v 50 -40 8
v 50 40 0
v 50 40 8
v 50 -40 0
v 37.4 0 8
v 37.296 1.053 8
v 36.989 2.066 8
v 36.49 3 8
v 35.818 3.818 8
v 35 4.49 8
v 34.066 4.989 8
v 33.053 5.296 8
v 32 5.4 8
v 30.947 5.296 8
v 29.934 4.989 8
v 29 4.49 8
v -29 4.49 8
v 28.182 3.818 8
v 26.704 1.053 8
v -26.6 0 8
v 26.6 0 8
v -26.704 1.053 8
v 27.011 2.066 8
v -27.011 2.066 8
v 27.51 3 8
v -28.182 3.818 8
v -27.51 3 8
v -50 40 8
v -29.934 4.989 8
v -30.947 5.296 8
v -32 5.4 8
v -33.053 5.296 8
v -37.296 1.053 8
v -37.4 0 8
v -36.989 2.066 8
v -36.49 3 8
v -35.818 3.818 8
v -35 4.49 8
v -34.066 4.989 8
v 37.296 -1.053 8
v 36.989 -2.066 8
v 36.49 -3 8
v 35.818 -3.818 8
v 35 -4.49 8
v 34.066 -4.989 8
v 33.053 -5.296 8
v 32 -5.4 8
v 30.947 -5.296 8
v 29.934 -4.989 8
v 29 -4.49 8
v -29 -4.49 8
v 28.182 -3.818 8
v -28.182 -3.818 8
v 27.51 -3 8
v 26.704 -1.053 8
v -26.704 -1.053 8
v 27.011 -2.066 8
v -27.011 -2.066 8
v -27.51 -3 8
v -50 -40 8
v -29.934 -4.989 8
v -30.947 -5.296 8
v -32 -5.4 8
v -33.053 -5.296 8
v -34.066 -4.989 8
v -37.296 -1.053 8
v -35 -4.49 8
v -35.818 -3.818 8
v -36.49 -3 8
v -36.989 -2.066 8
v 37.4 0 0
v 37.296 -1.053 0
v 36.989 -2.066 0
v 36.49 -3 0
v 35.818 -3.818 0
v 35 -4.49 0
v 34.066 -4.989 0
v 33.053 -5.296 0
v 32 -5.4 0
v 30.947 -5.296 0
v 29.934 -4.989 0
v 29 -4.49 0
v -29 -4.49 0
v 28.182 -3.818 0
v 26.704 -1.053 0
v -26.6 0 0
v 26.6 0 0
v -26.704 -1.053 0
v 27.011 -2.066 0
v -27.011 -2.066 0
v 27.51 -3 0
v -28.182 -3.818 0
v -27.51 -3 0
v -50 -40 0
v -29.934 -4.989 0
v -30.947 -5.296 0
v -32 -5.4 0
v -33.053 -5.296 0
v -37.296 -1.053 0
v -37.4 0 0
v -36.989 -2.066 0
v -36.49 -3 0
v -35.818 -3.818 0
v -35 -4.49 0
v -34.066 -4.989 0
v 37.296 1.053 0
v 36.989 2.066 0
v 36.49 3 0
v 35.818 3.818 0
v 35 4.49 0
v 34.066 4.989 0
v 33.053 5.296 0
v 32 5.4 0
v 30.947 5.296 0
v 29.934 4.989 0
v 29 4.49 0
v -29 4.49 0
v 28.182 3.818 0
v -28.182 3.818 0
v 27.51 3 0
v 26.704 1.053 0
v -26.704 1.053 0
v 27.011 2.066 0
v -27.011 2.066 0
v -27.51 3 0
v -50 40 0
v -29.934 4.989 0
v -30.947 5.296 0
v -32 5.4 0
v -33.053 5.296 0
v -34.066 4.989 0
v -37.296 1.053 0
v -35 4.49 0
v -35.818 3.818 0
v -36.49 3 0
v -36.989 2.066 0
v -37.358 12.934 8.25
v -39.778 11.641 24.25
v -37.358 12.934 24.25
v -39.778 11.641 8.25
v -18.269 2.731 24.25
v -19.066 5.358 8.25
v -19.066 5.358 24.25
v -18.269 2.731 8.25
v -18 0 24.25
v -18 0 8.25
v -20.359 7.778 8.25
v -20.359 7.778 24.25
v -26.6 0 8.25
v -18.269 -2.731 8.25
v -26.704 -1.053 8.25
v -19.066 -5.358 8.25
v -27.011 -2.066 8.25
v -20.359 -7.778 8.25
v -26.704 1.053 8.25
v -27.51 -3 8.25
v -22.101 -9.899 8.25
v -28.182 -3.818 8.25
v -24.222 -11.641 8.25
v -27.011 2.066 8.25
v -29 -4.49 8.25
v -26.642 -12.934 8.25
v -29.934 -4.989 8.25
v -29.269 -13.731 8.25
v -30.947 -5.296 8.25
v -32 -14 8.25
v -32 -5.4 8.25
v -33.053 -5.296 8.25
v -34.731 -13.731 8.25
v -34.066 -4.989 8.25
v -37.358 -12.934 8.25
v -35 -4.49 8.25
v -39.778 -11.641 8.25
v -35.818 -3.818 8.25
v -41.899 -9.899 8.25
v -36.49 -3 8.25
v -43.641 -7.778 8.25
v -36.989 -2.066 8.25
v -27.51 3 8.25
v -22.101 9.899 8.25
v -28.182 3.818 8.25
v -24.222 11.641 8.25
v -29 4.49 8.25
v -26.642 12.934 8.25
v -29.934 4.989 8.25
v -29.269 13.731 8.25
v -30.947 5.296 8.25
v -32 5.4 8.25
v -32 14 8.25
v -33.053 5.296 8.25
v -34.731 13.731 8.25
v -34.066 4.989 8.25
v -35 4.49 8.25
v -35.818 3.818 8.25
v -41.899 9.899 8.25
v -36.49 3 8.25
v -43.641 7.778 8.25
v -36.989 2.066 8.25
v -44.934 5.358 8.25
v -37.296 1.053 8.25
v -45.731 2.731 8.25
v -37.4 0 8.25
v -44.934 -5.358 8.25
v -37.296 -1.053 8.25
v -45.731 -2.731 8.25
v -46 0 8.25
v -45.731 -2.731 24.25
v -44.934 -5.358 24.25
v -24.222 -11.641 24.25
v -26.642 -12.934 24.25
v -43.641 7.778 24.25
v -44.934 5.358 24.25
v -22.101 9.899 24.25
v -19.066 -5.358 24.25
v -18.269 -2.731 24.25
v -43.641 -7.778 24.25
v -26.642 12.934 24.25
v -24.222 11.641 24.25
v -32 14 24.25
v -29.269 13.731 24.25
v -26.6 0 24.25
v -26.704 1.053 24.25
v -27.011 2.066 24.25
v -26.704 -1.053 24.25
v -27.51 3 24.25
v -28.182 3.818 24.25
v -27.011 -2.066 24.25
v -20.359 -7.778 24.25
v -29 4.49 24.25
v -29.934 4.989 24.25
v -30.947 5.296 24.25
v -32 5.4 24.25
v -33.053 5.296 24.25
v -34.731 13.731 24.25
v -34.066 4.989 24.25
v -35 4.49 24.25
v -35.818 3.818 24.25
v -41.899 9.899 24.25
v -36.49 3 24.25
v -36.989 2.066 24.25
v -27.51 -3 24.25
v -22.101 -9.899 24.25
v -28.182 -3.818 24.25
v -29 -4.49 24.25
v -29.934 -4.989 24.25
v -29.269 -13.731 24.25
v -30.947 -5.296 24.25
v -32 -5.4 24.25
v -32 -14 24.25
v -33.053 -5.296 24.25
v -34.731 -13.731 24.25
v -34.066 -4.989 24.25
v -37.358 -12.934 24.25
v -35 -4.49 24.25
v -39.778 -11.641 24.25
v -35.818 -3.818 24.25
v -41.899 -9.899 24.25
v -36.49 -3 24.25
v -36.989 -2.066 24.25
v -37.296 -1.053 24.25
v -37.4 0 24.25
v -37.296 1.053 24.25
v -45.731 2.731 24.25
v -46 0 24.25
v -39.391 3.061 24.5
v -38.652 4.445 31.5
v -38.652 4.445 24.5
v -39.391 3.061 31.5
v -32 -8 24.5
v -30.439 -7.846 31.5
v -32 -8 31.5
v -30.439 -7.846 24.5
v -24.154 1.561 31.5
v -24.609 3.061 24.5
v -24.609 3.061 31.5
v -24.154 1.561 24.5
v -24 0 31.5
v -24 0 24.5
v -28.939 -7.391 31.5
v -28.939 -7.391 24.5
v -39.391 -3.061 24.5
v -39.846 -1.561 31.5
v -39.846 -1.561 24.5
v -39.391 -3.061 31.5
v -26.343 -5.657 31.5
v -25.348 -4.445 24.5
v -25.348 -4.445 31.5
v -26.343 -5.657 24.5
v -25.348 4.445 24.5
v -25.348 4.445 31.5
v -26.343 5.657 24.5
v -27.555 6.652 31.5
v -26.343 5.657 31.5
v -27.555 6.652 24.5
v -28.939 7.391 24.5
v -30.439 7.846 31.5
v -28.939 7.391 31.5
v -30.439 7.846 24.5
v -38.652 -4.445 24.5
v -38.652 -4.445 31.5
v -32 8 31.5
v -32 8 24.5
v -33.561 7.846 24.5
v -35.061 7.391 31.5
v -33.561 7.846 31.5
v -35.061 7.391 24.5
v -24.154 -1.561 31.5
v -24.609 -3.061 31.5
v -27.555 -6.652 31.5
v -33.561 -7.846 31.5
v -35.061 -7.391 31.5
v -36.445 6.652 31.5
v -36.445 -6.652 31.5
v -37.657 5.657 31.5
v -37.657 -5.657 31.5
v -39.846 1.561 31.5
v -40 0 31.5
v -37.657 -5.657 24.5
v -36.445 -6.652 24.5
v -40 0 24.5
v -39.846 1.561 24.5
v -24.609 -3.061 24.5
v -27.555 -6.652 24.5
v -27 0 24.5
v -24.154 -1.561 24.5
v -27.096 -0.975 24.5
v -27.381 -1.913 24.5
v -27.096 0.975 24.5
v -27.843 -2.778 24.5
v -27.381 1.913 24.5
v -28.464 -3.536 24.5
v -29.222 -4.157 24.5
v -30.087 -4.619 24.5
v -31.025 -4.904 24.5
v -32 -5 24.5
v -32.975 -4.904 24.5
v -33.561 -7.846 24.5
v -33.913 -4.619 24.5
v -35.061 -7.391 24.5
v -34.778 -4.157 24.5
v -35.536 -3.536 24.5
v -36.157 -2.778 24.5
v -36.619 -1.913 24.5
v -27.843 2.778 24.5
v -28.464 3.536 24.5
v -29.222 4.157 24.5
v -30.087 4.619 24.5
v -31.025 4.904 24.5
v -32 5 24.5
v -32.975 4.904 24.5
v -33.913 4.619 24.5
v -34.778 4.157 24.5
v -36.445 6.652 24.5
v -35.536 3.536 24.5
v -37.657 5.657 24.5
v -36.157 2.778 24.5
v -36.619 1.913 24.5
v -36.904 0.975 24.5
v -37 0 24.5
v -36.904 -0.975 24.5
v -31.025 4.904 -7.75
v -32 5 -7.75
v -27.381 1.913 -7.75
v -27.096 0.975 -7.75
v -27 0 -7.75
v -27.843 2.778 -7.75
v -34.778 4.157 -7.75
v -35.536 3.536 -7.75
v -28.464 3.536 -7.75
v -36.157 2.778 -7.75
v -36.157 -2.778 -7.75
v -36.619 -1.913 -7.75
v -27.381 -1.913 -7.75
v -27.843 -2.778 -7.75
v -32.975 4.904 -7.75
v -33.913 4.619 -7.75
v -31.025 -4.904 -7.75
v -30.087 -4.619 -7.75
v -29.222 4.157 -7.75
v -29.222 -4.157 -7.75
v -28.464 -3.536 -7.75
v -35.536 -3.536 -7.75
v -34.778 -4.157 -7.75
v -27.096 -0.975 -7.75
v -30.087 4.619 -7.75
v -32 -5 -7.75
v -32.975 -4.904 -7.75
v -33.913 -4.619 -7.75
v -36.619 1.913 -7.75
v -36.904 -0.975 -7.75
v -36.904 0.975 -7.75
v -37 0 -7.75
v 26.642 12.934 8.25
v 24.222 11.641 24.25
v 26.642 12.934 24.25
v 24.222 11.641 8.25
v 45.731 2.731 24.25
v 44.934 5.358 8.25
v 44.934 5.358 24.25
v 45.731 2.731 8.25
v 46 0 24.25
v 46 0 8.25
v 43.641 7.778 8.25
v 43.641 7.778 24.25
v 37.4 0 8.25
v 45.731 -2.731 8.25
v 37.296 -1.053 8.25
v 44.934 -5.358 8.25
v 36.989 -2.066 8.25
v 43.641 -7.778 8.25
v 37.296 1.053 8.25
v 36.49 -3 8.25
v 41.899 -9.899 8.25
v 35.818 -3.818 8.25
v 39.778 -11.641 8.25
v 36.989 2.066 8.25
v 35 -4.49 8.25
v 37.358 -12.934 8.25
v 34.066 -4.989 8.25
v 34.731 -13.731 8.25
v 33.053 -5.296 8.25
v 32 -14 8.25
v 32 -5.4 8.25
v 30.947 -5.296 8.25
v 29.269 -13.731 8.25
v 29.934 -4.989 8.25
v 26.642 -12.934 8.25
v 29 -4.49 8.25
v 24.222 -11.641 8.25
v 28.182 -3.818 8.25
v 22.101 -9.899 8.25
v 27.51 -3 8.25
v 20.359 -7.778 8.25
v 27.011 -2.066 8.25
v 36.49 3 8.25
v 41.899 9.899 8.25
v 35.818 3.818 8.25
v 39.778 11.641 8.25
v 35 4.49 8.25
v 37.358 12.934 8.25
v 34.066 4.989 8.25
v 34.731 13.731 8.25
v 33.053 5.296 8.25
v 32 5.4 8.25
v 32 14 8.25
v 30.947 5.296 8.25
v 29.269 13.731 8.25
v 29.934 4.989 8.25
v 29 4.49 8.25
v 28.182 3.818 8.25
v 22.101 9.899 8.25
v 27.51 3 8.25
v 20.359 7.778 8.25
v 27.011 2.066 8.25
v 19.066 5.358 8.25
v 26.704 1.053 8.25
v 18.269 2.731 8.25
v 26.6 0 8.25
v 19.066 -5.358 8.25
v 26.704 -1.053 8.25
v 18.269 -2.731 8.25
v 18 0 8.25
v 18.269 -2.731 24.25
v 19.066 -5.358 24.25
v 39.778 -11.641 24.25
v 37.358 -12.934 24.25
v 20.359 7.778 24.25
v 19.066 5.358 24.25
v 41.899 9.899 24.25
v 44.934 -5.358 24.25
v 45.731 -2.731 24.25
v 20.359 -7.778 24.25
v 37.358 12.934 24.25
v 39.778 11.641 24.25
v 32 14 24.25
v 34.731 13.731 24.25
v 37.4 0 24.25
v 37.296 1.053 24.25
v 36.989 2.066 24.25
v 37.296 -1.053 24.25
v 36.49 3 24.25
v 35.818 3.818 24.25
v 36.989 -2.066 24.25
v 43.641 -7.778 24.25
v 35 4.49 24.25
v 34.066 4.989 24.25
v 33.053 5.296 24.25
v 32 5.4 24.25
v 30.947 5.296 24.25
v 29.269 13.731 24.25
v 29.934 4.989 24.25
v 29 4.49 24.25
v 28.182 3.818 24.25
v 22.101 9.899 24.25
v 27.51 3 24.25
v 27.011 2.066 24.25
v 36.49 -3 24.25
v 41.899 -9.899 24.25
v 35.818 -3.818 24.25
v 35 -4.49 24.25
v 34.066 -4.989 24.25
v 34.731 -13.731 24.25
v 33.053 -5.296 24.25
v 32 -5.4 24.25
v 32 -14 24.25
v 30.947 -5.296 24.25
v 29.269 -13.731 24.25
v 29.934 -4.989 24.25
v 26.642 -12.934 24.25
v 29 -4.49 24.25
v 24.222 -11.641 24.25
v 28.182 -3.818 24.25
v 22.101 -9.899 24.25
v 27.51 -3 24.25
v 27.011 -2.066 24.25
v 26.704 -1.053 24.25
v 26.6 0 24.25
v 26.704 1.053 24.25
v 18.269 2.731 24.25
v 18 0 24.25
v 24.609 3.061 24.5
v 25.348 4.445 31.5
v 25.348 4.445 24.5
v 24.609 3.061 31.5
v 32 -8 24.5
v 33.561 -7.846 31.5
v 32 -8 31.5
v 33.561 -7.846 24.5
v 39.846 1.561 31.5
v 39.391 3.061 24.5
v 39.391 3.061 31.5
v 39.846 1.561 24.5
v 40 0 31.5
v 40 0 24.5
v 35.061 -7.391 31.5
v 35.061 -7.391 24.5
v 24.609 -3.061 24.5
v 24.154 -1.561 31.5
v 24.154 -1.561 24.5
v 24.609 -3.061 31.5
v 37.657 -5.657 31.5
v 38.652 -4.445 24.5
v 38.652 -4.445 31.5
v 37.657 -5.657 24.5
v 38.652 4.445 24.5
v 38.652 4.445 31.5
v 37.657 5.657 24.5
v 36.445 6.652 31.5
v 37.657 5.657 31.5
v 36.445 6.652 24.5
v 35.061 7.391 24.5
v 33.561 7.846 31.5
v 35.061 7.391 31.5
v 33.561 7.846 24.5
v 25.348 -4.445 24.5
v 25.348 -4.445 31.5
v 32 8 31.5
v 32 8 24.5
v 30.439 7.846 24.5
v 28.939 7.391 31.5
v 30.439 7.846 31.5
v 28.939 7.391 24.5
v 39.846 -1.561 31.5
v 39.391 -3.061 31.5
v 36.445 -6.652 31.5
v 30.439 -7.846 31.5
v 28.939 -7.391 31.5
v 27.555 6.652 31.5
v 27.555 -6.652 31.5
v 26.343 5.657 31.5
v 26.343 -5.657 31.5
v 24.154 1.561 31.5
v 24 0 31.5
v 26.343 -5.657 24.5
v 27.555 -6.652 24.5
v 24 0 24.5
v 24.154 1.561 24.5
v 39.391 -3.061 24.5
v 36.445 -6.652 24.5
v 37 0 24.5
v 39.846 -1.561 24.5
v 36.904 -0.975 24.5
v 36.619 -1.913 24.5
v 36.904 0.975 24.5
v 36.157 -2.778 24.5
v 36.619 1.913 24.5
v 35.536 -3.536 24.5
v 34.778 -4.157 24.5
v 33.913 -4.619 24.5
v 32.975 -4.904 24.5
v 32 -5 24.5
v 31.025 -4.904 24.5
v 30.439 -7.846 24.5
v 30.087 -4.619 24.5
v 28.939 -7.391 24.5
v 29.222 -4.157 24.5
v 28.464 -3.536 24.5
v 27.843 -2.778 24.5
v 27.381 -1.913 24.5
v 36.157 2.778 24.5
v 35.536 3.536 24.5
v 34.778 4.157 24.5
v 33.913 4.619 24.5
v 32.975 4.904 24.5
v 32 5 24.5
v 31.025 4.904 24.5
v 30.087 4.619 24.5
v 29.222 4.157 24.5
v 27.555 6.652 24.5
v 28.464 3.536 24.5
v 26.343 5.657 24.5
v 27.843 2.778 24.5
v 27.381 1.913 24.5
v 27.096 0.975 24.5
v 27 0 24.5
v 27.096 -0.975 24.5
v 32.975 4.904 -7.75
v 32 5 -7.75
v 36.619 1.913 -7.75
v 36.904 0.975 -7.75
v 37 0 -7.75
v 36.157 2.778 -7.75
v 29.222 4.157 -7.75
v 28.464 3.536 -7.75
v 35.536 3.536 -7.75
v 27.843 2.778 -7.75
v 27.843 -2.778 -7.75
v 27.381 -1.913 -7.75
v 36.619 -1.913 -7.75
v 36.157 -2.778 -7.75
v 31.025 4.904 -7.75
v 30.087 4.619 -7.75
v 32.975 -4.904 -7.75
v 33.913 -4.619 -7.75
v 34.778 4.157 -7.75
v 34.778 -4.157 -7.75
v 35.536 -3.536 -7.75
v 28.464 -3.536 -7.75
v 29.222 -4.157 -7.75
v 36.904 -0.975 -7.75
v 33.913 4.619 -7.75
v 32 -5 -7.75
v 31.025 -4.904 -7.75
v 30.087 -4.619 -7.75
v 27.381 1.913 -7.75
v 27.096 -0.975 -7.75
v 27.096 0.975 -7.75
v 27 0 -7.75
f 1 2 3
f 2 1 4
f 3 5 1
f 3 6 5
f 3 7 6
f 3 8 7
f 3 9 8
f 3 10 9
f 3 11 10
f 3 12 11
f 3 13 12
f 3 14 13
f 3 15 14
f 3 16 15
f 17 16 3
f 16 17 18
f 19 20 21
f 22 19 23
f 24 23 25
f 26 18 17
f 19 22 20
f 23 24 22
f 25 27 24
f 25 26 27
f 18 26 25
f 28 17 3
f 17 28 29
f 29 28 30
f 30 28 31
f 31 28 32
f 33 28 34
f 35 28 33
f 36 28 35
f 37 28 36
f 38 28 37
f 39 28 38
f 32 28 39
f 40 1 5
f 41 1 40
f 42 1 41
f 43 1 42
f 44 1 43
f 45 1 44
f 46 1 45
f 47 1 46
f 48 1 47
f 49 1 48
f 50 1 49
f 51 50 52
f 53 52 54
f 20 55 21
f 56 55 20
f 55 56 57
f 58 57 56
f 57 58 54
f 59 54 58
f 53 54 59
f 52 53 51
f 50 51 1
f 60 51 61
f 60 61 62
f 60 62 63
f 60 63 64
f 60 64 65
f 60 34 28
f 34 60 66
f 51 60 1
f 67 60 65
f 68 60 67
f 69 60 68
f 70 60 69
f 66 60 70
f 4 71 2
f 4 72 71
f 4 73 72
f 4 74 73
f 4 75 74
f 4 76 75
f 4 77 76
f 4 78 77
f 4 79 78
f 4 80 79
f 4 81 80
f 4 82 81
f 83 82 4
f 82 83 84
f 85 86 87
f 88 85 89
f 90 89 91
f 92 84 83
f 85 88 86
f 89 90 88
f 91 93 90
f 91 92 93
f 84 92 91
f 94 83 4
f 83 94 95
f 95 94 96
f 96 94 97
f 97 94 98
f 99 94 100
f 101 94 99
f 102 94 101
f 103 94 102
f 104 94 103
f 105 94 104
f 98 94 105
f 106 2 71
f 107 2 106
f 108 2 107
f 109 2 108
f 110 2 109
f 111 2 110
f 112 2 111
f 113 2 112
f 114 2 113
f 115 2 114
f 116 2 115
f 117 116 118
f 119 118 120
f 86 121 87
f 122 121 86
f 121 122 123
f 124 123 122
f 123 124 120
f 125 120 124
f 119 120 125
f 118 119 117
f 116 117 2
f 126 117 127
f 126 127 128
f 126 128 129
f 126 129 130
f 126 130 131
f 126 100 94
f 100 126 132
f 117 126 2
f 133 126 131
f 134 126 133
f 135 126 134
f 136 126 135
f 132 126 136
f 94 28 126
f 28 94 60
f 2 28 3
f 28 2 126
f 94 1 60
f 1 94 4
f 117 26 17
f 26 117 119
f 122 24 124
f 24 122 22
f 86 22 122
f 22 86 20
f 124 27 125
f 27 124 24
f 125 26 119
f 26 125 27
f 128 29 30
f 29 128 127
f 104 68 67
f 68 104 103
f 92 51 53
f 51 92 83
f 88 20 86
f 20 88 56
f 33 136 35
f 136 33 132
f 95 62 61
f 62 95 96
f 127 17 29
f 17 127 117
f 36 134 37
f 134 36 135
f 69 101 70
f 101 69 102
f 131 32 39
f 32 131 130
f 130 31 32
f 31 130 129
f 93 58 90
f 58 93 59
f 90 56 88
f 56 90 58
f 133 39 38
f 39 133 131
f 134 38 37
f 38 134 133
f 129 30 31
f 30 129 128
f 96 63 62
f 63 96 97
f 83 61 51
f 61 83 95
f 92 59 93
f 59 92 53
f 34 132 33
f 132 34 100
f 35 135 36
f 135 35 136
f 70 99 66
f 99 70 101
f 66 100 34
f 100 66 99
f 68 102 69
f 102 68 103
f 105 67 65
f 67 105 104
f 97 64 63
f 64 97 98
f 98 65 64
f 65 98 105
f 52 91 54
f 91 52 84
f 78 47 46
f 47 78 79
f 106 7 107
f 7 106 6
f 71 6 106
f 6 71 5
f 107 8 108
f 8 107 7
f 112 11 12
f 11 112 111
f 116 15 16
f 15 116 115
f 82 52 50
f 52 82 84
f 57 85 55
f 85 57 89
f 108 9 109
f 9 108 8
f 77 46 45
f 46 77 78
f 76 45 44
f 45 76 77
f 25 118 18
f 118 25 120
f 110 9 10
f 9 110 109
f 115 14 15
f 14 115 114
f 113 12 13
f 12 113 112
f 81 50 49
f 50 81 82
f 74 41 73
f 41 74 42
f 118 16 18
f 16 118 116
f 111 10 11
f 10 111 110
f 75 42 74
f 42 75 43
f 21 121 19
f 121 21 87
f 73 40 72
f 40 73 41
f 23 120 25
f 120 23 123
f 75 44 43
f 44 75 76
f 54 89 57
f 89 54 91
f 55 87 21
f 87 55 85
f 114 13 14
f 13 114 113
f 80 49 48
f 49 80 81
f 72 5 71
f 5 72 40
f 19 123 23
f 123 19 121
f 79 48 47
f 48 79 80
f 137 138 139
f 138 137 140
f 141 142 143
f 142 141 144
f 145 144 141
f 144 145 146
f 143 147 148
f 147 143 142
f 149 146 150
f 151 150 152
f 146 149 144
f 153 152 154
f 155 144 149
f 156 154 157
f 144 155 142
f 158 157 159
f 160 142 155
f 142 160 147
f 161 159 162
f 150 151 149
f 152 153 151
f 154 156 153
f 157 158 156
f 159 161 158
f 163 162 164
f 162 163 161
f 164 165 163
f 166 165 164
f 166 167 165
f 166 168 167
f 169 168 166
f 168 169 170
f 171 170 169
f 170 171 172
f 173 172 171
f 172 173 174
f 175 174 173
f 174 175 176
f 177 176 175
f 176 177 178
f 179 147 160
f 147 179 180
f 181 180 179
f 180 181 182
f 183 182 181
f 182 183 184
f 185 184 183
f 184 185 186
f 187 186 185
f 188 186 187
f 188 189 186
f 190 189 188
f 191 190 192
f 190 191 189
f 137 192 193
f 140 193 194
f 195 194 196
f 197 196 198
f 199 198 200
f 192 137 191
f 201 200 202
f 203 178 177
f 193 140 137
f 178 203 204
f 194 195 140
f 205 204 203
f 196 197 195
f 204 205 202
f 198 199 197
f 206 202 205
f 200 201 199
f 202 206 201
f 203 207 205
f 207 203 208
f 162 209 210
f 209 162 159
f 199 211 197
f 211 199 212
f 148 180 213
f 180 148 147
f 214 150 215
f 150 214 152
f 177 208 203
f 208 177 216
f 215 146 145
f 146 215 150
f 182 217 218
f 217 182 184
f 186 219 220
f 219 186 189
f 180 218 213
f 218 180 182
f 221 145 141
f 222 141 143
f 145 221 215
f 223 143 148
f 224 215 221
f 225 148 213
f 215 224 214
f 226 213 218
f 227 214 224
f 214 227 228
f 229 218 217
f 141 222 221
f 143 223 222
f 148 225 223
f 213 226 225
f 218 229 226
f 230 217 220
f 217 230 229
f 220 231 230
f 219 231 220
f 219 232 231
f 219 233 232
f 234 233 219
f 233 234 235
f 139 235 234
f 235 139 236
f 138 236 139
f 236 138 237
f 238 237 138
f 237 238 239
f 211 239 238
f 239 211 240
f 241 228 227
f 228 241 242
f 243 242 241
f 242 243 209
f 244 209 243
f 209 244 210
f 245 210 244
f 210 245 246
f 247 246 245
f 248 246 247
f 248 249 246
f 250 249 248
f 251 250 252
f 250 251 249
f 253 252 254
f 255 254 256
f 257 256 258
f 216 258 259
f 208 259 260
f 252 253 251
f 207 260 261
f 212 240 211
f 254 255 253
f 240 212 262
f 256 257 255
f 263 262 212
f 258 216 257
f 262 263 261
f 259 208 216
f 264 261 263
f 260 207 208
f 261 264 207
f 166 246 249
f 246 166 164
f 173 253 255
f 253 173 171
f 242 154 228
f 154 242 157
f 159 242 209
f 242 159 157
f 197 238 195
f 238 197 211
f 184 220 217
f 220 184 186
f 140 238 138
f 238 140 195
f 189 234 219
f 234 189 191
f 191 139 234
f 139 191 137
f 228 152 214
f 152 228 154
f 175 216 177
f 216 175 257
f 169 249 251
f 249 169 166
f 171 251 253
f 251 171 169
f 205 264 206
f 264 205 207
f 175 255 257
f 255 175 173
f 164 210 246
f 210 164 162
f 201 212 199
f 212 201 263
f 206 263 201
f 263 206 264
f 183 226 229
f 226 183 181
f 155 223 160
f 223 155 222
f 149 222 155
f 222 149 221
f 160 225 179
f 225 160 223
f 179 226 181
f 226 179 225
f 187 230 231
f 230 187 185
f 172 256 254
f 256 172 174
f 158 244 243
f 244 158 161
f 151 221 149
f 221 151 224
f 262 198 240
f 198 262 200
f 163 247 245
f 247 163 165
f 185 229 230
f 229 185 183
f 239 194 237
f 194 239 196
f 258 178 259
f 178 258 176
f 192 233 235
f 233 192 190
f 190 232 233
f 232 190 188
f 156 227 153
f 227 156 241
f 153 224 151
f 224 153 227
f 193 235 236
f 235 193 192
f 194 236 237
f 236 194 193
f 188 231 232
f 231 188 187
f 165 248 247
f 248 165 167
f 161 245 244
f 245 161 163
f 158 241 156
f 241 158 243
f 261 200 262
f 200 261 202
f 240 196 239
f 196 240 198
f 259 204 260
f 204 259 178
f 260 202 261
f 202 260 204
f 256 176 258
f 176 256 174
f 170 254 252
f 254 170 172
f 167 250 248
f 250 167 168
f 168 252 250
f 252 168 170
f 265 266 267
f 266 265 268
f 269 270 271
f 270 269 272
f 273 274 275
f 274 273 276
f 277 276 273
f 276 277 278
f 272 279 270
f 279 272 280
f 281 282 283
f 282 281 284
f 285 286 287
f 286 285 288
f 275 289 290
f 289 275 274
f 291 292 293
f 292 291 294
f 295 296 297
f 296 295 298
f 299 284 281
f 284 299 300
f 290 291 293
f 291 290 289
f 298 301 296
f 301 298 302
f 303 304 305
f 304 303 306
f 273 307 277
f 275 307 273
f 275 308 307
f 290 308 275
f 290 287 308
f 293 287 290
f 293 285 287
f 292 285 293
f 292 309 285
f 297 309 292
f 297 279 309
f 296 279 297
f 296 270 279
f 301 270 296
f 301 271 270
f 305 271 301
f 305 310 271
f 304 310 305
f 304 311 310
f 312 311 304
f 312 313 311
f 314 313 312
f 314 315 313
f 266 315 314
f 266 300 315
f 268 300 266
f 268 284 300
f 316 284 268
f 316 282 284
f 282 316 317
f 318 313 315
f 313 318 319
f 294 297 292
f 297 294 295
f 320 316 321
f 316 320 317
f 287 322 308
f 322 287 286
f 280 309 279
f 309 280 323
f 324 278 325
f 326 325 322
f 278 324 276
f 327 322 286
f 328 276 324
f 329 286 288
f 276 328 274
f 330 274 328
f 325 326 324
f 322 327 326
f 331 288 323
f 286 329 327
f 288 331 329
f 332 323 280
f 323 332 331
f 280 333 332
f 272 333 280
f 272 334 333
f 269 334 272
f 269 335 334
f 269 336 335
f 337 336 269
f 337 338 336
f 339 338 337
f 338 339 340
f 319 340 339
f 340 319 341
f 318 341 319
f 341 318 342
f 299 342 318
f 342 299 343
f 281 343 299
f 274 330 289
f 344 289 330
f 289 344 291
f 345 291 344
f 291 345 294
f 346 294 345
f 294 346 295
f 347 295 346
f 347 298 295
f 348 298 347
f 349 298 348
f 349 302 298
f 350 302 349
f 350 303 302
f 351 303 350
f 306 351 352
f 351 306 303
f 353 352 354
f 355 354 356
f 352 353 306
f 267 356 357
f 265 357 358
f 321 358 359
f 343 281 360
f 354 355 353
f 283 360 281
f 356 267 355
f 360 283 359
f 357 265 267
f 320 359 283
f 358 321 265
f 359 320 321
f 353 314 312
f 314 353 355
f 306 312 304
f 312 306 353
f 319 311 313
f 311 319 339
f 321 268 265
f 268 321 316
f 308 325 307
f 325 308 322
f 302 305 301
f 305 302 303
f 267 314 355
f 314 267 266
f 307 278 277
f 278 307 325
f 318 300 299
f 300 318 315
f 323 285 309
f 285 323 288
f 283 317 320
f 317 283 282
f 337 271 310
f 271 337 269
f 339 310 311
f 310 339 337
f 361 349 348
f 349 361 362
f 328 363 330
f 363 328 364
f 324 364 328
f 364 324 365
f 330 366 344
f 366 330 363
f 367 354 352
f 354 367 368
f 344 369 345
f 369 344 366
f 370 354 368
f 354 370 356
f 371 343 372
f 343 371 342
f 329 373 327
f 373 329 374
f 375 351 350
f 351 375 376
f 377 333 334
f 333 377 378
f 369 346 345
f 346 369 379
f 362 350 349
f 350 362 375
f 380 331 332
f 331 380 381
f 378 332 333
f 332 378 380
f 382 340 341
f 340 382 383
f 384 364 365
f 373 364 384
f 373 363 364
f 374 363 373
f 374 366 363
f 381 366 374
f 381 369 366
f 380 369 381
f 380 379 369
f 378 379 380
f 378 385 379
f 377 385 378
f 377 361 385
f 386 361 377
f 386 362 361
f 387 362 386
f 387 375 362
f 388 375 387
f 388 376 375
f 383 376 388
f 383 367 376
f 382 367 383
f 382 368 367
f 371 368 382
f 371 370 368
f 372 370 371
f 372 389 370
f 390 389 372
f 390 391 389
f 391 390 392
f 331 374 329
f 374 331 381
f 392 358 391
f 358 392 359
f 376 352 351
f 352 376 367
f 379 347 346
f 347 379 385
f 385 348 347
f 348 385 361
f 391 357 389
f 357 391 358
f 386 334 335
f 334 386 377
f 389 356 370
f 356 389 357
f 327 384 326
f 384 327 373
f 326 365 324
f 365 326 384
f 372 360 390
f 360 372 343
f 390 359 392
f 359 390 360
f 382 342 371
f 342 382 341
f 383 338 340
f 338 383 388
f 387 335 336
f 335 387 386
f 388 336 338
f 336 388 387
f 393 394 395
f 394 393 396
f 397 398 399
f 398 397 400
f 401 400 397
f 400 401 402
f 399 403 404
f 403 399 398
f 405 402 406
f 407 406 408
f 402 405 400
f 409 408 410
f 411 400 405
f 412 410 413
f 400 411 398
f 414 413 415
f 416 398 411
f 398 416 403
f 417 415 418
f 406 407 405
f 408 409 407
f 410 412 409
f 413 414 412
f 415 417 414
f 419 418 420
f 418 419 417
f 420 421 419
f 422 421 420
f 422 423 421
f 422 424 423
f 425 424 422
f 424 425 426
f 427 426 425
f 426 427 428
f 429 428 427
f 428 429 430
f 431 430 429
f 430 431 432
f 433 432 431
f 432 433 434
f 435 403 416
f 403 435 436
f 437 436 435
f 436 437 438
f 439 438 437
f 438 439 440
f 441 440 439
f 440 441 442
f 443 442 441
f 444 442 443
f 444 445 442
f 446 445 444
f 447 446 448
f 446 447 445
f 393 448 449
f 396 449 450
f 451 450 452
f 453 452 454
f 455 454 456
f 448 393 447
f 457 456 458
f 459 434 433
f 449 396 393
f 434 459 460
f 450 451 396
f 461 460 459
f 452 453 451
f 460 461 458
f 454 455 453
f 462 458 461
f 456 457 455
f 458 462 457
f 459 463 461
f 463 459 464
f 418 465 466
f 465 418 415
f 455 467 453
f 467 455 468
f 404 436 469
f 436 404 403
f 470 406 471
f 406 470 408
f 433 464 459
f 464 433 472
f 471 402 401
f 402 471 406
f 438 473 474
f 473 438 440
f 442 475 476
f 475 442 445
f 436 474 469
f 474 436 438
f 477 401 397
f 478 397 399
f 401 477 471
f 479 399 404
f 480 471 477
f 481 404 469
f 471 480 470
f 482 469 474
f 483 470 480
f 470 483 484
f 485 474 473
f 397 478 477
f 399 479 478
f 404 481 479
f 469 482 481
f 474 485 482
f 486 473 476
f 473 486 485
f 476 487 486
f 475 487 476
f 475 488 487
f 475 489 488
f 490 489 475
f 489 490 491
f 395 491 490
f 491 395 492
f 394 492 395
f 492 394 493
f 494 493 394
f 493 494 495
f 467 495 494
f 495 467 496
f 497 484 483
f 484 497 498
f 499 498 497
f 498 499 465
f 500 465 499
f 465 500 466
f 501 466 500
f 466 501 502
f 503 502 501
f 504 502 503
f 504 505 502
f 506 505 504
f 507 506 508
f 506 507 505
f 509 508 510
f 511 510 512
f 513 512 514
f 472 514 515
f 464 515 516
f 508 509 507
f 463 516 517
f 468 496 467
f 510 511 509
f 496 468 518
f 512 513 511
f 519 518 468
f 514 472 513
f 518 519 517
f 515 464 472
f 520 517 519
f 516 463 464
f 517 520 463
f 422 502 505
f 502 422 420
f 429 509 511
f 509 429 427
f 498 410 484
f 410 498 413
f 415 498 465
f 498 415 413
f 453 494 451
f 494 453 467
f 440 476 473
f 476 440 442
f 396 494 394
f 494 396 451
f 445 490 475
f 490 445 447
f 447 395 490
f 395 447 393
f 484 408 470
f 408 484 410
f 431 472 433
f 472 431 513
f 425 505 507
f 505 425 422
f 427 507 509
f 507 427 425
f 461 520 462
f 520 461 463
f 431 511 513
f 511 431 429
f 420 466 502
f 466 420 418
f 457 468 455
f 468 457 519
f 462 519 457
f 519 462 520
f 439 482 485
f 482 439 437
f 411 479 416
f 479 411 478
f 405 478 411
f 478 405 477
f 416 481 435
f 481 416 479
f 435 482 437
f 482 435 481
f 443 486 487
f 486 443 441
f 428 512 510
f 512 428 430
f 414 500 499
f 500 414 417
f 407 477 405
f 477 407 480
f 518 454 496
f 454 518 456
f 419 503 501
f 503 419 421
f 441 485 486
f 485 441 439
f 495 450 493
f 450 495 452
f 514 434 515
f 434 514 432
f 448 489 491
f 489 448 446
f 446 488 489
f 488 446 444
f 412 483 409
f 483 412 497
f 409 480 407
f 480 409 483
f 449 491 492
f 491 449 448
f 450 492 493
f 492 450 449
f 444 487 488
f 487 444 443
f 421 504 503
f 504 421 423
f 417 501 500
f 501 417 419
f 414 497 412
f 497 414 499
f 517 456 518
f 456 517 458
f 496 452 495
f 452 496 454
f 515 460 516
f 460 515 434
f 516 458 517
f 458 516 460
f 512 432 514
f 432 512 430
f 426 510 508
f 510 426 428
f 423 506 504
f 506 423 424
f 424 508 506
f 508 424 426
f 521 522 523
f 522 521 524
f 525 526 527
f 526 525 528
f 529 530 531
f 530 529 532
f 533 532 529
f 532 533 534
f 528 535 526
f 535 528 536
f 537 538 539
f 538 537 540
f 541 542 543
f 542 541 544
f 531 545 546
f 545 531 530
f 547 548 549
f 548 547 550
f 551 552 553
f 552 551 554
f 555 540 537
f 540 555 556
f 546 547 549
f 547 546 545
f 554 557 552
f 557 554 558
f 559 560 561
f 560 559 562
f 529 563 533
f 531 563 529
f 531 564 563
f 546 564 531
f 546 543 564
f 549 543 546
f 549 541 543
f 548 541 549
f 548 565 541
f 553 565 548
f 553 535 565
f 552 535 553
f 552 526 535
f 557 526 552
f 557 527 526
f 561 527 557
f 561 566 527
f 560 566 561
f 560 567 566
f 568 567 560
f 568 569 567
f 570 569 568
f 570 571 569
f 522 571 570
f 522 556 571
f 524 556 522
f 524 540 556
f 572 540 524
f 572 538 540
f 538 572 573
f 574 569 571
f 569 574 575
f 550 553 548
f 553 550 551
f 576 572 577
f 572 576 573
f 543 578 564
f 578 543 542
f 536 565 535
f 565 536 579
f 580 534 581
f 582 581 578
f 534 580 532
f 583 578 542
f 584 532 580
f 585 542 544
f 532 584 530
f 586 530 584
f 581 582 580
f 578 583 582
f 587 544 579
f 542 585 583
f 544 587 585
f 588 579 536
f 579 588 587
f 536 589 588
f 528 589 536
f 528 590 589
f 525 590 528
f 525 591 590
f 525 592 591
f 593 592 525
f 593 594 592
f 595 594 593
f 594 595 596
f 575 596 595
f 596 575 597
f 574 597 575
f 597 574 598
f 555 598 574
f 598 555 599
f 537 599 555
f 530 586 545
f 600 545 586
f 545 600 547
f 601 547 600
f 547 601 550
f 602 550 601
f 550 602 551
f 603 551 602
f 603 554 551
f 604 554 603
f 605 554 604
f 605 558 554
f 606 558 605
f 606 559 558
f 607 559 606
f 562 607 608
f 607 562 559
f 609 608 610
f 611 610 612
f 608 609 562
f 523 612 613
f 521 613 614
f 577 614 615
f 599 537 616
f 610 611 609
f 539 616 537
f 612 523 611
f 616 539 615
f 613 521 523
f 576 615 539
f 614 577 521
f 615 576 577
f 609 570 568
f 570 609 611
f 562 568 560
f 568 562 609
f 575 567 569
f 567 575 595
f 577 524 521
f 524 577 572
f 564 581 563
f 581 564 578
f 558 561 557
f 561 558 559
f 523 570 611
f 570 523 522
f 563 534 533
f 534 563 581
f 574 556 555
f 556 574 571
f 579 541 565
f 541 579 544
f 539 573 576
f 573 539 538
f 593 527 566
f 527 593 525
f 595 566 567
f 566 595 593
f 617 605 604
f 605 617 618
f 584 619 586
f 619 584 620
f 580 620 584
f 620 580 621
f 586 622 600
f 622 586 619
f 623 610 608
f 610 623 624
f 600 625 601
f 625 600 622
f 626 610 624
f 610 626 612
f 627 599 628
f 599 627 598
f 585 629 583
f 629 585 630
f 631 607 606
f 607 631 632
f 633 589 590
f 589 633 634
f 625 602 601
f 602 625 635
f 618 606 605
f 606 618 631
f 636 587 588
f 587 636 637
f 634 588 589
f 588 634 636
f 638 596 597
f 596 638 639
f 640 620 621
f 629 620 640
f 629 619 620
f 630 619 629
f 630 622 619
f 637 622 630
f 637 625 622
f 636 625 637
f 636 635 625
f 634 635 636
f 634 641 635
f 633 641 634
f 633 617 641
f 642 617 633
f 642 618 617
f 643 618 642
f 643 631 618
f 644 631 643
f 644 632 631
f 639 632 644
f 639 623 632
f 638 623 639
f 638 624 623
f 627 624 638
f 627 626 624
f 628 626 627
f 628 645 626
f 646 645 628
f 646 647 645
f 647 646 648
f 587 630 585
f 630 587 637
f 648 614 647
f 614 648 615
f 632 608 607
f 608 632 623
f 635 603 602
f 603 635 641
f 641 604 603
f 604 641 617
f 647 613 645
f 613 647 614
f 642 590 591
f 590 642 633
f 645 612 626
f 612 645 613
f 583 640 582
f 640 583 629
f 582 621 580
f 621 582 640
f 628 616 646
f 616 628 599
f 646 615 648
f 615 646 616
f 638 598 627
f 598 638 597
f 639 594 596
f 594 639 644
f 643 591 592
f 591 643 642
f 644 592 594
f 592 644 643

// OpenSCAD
$fn = 32;

// ------------------------------------------------------------------------
// Standoff columns: 2 d28 standoffs, bolts d10
// Every part is its own module, assembly() places them once.
// ------------------------------------------------------------------------

// --- part 1 ---
module base_plate() {
  difference() {
    translate([-50, -40, 0]) cube([100, 80, 8]);
    translate([-32, 0, -1]) cylinder(h = 10, d = 10.8);
    translate([32, 0, -1]) cylinder(h = 10, d = 10.8);
  }
}

// --- part 2 ---
module spacer1() {
  difference() {
      translate([0, 0, 0]) cylinder(h = 16, d = 28);
      translate([0, 0, -1]) cylinder(h = 18, d = 10.8);
    }
}

// --- part 3 ---
module bolt1() {
  cylinder(h = 7, d = 16);
  translate([0, 0, -32.25]) cylinder(h = 32.25, d = 10);
}

// --- part 4 ---
module spacer2() {
  difference() {
      translate([0, 0, 0]) cylinder(h = 16, d = 28);
      translate([0, 0, -1]) cylinder(h = 18, d = 10.8);
    }
}

// --- part 5 ---
module bolt2() {
  cylinder(h = 7, d = 16);
  translate([0, 0, -32.25]) cylinder(h = 32.25, d = 10);
}

// --- assembly ---
module assembly() {
  translate([0, 0, 0]) rotate([0, 0, 0]) base_plate();
  translate([-32, 0, 8.25]) rotate([0, 0, 0]) spacer1();
  translate([-32, 0, 24.5]) rotate([0, 0, 0]) bolt1();
  translate([32, 0, 8.25]) rotate([0, 0, 0]) spacer2();
  translate([32, 0, 24.5]) rotate([0, 0, 0]) bolt2();
}

assembly();
